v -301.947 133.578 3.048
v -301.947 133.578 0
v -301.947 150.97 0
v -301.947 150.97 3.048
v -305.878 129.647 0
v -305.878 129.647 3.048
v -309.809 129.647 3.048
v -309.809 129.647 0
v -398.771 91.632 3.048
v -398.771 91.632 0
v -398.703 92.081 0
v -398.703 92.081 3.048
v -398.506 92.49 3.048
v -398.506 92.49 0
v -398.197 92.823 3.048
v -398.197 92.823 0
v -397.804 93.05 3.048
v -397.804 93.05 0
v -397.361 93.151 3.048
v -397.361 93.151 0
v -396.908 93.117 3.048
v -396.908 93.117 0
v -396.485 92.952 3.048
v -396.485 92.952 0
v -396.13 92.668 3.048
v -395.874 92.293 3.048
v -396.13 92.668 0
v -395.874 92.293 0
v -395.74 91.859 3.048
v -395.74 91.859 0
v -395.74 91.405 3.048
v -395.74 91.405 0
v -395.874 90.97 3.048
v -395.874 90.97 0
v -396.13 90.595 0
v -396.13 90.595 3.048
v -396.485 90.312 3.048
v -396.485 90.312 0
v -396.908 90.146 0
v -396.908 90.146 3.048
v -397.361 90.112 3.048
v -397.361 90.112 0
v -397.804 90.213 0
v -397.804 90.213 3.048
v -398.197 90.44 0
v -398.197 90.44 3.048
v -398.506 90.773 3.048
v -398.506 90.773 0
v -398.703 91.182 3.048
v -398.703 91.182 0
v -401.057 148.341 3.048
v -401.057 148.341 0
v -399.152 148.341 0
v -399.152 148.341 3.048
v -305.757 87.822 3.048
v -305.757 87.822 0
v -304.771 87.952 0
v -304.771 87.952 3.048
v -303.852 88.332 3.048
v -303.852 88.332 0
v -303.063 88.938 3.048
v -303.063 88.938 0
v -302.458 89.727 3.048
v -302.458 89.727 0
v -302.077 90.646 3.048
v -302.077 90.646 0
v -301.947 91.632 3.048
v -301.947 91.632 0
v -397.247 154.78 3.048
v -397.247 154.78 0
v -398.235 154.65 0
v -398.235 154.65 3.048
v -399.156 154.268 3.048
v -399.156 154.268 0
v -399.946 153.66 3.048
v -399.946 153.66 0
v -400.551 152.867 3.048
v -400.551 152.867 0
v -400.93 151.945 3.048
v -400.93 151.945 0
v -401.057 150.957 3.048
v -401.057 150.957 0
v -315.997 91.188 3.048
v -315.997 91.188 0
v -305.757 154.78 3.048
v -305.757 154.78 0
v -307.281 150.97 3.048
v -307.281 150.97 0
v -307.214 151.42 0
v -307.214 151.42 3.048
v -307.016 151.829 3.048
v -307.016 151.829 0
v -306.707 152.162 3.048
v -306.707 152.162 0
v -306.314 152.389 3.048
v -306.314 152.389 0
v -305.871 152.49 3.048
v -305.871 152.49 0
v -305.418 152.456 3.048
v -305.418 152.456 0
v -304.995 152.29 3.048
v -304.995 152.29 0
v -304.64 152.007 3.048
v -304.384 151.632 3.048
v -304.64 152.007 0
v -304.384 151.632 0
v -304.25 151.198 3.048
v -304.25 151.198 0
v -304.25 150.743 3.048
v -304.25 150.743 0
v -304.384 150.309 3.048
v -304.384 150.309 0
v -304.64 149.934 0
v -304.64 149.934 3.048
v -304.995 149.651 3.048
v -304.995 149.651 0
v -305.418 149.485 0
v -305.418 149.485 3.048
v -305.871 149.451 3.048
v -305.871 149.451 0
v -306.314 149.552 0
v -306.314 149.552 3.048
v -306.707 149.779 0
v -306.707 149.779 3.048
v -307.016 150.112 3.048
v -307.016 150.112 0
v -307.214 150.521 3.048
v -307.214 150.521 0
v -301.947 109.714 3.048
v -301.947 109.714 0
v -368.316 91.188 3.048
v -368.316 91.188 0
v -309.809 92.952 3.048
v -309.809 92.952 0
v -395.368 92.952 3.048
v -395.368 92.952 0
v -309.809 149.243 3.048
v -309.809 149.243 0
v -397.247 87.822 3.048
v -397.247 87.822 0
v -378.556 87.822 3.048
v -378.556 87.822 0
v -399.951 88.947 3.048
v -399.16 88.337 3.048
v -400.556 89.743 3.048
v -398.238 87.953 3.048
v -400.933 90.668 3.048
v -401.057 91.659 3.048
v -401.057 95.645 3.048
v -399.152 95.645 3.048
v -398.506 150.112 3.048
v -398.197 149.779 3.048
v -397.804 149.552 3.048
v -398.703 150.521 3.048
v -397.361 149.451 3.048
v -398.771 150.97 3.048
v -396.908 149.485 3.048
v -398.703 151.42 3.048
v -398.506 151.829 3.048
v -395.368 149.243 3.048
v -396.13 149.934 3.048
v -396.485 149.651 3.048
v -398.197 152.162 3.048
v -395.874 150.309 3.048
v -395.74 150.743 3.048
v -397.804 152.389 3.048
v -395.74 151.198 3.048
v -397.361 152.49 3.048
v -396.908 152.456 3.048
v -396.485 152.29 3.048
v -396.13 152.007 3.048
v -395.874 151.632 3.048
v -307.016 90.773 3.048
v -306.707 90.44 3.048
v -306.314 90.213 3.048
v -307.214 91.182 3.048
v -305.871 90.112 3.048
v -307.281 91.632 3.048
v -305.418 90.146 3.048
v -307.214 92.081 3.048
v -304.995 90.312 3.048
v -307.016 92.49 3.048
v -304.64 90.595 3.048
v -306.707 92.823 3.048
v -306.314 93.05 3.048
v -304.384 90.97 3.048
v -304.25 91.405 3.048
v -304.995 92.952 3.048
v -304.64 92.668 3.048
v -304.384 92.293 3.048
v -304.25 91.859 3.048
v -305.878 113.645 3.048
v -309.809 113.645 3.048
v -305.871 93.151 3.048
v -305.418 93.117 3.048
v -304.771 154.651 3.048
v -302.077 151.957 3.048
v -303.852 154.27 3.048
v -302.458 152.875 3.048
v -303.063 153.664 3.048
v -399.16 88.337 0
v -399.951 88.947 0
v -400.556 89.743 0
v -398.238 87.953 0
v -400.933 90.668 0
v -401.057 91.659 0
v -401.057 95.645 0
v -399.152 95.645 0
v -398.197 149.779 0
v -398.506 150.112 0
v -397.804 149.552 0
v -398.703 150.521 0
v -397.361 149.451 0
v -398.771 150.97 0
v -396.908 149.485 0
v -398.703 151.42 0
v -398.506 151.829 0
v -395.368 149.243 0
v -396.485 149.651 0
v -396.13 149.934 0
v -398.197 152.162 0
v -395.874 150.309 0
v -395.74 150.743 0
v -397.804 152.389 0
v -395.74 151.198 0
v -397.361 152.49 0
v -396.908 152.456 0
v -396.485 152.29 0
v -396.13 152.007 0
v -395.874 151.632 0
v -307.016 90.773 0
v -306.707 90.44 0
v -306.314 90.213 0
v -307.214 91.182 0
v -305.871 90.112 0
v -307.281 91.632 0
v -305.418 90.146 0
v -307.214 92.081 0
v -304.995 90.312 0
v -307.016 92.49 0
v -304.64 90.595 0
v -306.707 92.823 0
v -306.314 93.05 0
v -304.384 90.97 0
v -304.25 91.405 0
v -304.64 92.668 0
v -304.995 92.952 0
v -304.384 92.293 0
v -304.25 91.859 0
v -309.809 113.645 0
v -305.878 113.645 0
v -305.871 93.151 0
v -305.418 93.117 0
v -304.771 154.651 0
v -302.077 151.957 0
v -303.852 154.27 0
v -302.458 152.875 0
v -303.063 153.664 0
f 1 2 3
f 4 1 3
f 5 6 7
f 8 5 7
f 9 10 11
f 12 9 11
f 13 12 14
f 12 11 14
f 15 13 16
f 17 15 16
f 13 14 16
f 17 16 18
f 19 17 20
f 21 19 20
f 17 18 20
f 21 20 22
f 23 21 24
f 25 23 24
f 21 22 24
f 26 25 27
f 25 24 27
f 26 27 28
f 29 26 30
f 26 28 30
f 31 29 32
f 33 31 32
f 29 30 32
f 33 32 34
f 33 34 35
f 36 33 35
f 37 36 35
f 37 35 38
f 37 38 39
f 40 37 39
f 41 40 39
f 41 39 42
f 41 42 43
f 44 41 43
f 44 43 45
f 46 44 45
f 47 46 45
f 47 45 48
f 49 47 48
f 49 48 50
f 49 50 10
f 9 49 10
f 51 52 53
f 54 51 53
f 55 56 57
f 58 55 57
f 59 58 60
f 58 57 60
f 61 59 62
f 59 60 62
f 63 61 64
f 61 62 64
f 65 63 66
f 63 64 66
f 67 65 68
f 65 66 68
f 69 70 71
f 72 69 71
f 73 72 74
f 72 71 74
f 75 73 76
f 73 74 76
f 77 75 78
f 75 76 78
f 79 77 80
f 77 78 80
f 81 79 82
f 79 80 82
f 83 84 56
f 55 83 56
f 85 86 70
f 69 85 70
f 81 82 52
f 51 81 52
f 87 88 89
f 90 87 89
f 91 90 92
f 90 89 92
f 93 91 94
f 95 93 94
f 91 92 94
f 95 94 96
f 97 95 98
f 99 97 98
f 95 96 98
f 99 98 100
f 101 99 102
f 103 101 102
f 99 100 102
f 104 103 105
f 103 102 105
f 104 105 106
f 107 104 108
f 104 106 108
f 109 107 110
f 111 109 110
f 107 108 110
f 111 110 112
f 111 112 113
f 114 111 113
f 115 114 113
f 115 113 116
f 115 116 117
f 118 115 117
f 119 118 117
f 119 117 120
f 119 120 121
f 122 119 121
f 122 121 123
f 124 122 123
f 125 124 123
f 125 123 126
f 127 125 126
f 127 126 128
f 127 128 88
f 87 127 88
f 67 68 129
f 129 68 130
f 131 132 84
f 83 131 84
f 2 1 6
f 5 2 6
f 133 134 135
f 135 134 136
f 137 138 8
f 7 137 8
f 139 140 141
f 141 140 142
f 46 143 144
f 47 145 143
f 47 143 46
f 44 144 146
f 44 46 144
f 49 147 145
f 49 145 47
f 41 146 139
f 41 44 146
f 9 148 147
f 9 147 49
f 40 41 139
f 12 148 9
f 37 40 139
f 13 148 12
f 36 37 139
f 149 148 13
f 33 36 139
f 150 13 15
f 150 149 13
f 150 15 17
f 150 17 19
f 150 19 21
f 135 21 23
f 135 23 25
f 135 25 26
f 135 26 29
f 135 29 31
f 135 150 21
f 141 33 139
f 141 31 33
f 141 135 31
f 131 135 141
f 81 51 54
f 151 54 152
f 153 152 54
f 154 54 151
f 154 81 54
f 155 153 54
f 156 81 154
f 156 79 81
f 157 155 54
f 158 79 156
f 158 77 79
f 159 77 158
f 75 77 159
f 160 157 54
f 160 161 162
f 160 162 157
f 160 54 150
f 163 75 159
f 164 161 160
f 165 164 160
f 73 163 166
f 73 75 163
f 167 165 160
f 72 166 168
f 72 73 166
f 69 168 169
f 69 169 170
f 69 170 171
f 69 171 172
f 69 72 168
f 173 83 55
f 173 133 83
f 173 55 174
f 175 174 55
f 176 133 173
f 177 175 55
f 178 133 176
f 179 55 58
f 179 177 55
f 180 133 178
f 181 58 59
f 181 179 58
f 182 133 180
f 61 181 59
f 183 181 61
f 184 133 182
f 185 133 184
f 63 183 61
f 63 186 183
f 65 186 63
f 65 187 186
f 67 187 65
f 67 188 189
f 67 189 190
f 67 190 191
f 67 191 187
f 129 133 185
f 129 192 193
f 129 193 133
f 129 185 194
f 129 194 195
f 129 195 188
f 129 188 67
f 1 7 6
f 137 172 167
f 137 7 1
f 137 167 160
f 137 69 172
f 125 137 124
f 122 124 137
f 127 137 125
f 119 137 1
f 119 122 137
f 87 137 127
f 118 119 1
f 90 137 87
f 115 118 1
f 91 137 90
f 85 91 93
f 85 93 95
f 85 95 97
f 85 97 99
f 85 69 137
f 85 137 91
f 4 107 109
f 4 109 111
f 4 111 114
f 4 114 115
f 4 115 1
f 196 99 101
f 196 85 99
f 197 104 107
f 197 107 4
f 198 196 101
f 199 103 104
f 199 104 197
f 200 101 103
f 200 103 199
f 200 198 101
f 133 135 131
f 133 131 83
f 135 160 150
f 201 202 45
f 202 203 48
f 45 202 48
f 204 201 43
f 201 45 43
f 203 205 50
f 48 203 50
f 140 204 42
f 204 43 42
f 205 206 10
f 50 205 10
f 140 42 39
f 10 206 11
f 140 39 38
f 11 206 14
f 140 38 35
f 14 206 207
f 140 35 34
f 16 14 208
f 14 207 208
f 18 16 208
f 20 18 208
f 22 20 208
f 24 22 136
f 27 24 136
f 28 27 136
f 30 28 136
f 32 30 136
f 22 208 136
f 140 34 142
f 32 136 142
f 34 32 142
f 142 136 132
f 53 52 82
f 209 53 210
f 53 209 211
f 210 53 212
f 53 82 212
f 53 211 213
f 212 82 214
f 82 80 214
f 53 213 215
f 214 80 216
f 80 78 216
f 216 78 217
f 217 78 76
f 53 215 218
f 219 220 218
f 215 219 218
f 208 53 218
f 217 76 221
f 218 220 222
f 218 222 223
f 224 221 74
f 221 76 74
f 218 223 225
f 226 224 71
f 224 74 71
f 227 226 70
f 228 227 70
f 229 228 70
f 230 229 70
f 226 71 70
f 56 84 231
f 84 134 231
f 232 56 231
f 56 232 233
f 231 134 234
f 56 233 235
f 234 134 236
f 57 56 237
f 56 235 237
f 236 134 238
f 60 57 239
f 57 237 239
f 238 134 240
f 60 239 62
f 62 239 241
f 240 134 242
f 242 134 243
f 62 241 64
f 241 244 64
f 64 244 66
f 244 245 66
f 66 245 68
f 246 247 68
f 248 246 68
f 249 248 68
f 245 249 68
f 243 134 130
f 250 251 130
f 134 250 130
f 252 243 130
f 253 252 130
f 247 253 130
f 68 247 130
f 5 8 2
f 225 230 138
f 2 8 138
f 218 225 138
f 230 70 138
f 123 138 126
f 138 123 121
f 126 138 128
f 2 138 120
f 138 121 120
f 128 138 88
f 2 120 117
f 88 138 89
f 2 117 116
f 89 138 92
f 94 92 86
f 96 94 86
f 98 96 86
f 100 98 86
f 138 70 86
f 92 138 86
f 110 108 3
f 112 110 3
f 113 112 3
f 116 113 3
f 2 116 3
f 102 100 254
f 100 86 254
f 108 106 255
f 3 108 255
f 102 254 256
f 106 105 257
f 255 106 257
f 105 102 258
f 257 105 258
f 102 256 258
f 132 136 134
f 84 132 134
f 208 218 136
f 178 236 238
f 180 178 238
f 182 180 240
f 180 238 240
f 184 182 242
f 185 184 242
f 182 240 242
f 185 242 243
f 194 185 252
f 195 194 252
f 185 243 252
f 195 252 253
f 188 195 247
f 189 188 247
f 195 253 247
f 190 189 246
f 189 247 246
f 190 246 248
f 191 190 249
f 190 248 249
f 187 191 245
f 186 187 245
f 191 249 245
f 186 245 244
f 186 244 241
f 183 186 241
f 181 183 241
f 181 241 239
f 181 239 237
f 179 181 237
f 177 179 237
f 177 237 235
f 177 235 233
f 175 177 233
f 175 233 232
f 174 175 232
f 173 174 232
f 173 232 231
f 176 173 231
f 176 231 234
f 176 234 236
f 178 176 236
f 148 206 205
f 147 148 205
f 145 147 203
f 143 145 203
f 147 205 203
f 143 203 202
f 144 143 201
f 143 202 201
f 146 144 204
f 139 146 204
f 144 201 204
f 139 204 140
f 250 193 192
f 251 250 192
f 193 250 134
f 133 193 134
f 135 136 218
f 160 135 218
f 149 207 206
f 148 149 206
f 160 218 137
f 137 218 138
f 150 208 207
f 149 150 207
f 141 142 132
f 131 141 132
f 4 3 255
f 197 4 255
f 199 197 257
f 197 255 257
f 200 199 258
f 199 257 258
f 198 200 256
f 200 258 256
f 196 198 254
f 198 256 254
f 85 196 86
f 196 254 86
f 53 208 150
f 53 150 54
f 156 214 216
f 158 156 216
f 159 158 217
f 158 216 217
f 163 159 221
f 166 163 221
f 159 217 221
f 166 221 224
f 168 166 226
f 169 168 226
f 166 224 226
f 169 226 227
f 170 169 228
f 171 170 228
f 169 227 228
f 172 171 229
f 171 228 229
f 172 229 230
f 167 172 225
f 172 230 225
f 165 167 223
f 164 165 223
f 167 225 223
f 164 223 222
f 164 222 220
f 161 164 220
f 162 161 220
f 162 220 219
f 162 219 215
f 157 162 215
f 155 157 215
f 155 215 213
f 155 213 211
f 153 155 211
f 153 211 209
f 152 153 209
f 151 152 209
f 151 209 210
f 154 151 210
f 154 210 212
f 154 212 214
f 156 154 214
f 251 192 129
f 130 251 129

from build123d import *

# Parameters (mm, degrees)
SKETCH1_R           = 1.3462
SKETCH1_W           = 3.7846
SKETCH1_H           = 52.6961
BOSS_EXTRUDE1_DEPTH = 3.048
SKETCH2_R           = 1.524
CUT_EXTRUDE1_DEPTH  = 4.048
CUT_EXTRUDE2_DEPTH  = 4.048


with BuildPart() as part:
    # Sketch1 → Boss-Extrude1 (new body)
    with BuildSketch(Plane.XY):
        with BuildLine():
            Line((-401.0571, 150.956597849), (-401.0571, 148.341))
            Line((-401.0571, 148.341), (-399.1521, 148.341))
            Line((-399.1521, 148.341), (-395.3675, 148.341))
            Line((-395.3675, 148.341), (-395.3675, 149.2432))
            Line((-395.3675, 149.2432), (-309.8086, 149.2432))
            Line((-309.8086, 149.2432), (-309.8086, 128.8851))
            Line((-309.8086, 128.8851), (-305.87795, 128.8851))
            Line((-305.87795, 128.8851), (-301.9473, 132.81575))
            Line((-301.9473, 132.81575), (-301.9473, 150.9704))
            ThreePointArc((-301.9473, 150.9704), (-303.063223164, 153.664476836), (-305.7573, 154.7804))
            Line((-305.7573, 154.7804), (-397.247125, 154.7804))
            ThreePointArc((-397.247125, 154.7804), (-399.946077222, 153.659592612), (-401.0571, 150.956597849))
        make_face()
        with Locations((-397.247125, 150.9704)):
            Circle(SKETCH1_R, mode=Mode.SUBTRACT)
        with Locations((-305.7573, 150.9704)):
            Circle(SKETCH1_R, mode=Mode.SUBTRACT)
        with Locations((-397.2598, 121.99295)):
            Rectangle(SKETCH1_W, SKETCH1_H)
        with BuildLine():
            Line((-395.3675, 95.6449), (-399.1521, 95.6449))
            Line((-399.1521, 95.6449), (-401.0571, 95.6449))
            Line((-401.0571, 95.6449), (-401.0571, 91.659304166))
            ThreePointArc((-401.0571, 91.659304166), (-399.951018769, 88.947400452), (-397.2472, 87.8217))
            Line((-397.2472, 87.8217), (-378.5565, 87.8217))
            Line((-378.5565, 87.8217), (-368.3165, 91.1883))
            Line((-368.3165, 91.1883), (-315.9973, 91.1883))
            Line((-315.9973, 91.1883), (-305.7573, 87.8217))
            ThreePointArc((-305.7573, 87.8217), (-303.063223164, 88.937623164), (-301.9473, 91.6317))
            Line((-301.9473, 91.6317), (-301.9473, 111.74645))
            Line((-301.9473, 111.74645), (-305.87795, 115.6771))
            Line((-305.87795, 115.6771), (-309.8086, 115.6771))
            Line((-309.8086, 115.6771), (-309.8086, 92.9525))
            Line((-309.8086, 92.9525), (-395.3675, 92.9525))
            Line((-395.3675, 92.9525), (-395.3675, 95.6449))
        make_face()
        with Locations((-397.2472, 91.6317)):
            Circle(SKETCH1_R, mode=Mode.SUBTRACT)
        with Locations((-305.7573, 91.6317)):
            Circle(SKETCH1_R, mode=Mode.SUBTRACT)
    extrude(amount=BOSS_EXTRUDE1_DEPTH)

    # Sketch2 → Cut-Extrude1 (cut, through all)
    with BuildSketch(Plane(origin=(0, 0, 0), x_dir=(-1, 0, 0), z_dir=(0, 0, -1))):
        with Locations((305.7573, 150.9704)):
            Circle(SKETCH2_R)
        with Locations((305.7573, 91.6317)):
            Circle(SKETCH2_R)
        with Locations((397.2472, 91.6317)):
            Circle(SKETCH2_R)
        with Locations((397.247125, 150.9704)):
            Circle(SKETCH2_R)
    extrude(amount=-CUT_EXTRUDE1_DEPTH, mode=Mode.SUBTRACT)

    # Sketch3 → Cut-Extrude2 (cut, through all)
    with BuildSketch(Plane.XY.offset(3.048)):
        Polygon((-309.8086, 129.6471), (-309.8086, 128.8851), (-305.87795, 128.8851), (-301.9473, 132.81575), (-301.9473, 133.57775), (-305.87795, 129.6471), align=None)
        Polygon((-305.87795, 115.6771), (-309.8086, 115.6771), (-309.8086, 113.6451), (-305.87795, 113.6451), (-301.9473, 109.71445), (-301.9473, 111.74645), align=None)
    extrude(amount=-CUT_EXTRUDE2_DEPTH, mode=Mode.SUBTRACT)


solid = part.part
